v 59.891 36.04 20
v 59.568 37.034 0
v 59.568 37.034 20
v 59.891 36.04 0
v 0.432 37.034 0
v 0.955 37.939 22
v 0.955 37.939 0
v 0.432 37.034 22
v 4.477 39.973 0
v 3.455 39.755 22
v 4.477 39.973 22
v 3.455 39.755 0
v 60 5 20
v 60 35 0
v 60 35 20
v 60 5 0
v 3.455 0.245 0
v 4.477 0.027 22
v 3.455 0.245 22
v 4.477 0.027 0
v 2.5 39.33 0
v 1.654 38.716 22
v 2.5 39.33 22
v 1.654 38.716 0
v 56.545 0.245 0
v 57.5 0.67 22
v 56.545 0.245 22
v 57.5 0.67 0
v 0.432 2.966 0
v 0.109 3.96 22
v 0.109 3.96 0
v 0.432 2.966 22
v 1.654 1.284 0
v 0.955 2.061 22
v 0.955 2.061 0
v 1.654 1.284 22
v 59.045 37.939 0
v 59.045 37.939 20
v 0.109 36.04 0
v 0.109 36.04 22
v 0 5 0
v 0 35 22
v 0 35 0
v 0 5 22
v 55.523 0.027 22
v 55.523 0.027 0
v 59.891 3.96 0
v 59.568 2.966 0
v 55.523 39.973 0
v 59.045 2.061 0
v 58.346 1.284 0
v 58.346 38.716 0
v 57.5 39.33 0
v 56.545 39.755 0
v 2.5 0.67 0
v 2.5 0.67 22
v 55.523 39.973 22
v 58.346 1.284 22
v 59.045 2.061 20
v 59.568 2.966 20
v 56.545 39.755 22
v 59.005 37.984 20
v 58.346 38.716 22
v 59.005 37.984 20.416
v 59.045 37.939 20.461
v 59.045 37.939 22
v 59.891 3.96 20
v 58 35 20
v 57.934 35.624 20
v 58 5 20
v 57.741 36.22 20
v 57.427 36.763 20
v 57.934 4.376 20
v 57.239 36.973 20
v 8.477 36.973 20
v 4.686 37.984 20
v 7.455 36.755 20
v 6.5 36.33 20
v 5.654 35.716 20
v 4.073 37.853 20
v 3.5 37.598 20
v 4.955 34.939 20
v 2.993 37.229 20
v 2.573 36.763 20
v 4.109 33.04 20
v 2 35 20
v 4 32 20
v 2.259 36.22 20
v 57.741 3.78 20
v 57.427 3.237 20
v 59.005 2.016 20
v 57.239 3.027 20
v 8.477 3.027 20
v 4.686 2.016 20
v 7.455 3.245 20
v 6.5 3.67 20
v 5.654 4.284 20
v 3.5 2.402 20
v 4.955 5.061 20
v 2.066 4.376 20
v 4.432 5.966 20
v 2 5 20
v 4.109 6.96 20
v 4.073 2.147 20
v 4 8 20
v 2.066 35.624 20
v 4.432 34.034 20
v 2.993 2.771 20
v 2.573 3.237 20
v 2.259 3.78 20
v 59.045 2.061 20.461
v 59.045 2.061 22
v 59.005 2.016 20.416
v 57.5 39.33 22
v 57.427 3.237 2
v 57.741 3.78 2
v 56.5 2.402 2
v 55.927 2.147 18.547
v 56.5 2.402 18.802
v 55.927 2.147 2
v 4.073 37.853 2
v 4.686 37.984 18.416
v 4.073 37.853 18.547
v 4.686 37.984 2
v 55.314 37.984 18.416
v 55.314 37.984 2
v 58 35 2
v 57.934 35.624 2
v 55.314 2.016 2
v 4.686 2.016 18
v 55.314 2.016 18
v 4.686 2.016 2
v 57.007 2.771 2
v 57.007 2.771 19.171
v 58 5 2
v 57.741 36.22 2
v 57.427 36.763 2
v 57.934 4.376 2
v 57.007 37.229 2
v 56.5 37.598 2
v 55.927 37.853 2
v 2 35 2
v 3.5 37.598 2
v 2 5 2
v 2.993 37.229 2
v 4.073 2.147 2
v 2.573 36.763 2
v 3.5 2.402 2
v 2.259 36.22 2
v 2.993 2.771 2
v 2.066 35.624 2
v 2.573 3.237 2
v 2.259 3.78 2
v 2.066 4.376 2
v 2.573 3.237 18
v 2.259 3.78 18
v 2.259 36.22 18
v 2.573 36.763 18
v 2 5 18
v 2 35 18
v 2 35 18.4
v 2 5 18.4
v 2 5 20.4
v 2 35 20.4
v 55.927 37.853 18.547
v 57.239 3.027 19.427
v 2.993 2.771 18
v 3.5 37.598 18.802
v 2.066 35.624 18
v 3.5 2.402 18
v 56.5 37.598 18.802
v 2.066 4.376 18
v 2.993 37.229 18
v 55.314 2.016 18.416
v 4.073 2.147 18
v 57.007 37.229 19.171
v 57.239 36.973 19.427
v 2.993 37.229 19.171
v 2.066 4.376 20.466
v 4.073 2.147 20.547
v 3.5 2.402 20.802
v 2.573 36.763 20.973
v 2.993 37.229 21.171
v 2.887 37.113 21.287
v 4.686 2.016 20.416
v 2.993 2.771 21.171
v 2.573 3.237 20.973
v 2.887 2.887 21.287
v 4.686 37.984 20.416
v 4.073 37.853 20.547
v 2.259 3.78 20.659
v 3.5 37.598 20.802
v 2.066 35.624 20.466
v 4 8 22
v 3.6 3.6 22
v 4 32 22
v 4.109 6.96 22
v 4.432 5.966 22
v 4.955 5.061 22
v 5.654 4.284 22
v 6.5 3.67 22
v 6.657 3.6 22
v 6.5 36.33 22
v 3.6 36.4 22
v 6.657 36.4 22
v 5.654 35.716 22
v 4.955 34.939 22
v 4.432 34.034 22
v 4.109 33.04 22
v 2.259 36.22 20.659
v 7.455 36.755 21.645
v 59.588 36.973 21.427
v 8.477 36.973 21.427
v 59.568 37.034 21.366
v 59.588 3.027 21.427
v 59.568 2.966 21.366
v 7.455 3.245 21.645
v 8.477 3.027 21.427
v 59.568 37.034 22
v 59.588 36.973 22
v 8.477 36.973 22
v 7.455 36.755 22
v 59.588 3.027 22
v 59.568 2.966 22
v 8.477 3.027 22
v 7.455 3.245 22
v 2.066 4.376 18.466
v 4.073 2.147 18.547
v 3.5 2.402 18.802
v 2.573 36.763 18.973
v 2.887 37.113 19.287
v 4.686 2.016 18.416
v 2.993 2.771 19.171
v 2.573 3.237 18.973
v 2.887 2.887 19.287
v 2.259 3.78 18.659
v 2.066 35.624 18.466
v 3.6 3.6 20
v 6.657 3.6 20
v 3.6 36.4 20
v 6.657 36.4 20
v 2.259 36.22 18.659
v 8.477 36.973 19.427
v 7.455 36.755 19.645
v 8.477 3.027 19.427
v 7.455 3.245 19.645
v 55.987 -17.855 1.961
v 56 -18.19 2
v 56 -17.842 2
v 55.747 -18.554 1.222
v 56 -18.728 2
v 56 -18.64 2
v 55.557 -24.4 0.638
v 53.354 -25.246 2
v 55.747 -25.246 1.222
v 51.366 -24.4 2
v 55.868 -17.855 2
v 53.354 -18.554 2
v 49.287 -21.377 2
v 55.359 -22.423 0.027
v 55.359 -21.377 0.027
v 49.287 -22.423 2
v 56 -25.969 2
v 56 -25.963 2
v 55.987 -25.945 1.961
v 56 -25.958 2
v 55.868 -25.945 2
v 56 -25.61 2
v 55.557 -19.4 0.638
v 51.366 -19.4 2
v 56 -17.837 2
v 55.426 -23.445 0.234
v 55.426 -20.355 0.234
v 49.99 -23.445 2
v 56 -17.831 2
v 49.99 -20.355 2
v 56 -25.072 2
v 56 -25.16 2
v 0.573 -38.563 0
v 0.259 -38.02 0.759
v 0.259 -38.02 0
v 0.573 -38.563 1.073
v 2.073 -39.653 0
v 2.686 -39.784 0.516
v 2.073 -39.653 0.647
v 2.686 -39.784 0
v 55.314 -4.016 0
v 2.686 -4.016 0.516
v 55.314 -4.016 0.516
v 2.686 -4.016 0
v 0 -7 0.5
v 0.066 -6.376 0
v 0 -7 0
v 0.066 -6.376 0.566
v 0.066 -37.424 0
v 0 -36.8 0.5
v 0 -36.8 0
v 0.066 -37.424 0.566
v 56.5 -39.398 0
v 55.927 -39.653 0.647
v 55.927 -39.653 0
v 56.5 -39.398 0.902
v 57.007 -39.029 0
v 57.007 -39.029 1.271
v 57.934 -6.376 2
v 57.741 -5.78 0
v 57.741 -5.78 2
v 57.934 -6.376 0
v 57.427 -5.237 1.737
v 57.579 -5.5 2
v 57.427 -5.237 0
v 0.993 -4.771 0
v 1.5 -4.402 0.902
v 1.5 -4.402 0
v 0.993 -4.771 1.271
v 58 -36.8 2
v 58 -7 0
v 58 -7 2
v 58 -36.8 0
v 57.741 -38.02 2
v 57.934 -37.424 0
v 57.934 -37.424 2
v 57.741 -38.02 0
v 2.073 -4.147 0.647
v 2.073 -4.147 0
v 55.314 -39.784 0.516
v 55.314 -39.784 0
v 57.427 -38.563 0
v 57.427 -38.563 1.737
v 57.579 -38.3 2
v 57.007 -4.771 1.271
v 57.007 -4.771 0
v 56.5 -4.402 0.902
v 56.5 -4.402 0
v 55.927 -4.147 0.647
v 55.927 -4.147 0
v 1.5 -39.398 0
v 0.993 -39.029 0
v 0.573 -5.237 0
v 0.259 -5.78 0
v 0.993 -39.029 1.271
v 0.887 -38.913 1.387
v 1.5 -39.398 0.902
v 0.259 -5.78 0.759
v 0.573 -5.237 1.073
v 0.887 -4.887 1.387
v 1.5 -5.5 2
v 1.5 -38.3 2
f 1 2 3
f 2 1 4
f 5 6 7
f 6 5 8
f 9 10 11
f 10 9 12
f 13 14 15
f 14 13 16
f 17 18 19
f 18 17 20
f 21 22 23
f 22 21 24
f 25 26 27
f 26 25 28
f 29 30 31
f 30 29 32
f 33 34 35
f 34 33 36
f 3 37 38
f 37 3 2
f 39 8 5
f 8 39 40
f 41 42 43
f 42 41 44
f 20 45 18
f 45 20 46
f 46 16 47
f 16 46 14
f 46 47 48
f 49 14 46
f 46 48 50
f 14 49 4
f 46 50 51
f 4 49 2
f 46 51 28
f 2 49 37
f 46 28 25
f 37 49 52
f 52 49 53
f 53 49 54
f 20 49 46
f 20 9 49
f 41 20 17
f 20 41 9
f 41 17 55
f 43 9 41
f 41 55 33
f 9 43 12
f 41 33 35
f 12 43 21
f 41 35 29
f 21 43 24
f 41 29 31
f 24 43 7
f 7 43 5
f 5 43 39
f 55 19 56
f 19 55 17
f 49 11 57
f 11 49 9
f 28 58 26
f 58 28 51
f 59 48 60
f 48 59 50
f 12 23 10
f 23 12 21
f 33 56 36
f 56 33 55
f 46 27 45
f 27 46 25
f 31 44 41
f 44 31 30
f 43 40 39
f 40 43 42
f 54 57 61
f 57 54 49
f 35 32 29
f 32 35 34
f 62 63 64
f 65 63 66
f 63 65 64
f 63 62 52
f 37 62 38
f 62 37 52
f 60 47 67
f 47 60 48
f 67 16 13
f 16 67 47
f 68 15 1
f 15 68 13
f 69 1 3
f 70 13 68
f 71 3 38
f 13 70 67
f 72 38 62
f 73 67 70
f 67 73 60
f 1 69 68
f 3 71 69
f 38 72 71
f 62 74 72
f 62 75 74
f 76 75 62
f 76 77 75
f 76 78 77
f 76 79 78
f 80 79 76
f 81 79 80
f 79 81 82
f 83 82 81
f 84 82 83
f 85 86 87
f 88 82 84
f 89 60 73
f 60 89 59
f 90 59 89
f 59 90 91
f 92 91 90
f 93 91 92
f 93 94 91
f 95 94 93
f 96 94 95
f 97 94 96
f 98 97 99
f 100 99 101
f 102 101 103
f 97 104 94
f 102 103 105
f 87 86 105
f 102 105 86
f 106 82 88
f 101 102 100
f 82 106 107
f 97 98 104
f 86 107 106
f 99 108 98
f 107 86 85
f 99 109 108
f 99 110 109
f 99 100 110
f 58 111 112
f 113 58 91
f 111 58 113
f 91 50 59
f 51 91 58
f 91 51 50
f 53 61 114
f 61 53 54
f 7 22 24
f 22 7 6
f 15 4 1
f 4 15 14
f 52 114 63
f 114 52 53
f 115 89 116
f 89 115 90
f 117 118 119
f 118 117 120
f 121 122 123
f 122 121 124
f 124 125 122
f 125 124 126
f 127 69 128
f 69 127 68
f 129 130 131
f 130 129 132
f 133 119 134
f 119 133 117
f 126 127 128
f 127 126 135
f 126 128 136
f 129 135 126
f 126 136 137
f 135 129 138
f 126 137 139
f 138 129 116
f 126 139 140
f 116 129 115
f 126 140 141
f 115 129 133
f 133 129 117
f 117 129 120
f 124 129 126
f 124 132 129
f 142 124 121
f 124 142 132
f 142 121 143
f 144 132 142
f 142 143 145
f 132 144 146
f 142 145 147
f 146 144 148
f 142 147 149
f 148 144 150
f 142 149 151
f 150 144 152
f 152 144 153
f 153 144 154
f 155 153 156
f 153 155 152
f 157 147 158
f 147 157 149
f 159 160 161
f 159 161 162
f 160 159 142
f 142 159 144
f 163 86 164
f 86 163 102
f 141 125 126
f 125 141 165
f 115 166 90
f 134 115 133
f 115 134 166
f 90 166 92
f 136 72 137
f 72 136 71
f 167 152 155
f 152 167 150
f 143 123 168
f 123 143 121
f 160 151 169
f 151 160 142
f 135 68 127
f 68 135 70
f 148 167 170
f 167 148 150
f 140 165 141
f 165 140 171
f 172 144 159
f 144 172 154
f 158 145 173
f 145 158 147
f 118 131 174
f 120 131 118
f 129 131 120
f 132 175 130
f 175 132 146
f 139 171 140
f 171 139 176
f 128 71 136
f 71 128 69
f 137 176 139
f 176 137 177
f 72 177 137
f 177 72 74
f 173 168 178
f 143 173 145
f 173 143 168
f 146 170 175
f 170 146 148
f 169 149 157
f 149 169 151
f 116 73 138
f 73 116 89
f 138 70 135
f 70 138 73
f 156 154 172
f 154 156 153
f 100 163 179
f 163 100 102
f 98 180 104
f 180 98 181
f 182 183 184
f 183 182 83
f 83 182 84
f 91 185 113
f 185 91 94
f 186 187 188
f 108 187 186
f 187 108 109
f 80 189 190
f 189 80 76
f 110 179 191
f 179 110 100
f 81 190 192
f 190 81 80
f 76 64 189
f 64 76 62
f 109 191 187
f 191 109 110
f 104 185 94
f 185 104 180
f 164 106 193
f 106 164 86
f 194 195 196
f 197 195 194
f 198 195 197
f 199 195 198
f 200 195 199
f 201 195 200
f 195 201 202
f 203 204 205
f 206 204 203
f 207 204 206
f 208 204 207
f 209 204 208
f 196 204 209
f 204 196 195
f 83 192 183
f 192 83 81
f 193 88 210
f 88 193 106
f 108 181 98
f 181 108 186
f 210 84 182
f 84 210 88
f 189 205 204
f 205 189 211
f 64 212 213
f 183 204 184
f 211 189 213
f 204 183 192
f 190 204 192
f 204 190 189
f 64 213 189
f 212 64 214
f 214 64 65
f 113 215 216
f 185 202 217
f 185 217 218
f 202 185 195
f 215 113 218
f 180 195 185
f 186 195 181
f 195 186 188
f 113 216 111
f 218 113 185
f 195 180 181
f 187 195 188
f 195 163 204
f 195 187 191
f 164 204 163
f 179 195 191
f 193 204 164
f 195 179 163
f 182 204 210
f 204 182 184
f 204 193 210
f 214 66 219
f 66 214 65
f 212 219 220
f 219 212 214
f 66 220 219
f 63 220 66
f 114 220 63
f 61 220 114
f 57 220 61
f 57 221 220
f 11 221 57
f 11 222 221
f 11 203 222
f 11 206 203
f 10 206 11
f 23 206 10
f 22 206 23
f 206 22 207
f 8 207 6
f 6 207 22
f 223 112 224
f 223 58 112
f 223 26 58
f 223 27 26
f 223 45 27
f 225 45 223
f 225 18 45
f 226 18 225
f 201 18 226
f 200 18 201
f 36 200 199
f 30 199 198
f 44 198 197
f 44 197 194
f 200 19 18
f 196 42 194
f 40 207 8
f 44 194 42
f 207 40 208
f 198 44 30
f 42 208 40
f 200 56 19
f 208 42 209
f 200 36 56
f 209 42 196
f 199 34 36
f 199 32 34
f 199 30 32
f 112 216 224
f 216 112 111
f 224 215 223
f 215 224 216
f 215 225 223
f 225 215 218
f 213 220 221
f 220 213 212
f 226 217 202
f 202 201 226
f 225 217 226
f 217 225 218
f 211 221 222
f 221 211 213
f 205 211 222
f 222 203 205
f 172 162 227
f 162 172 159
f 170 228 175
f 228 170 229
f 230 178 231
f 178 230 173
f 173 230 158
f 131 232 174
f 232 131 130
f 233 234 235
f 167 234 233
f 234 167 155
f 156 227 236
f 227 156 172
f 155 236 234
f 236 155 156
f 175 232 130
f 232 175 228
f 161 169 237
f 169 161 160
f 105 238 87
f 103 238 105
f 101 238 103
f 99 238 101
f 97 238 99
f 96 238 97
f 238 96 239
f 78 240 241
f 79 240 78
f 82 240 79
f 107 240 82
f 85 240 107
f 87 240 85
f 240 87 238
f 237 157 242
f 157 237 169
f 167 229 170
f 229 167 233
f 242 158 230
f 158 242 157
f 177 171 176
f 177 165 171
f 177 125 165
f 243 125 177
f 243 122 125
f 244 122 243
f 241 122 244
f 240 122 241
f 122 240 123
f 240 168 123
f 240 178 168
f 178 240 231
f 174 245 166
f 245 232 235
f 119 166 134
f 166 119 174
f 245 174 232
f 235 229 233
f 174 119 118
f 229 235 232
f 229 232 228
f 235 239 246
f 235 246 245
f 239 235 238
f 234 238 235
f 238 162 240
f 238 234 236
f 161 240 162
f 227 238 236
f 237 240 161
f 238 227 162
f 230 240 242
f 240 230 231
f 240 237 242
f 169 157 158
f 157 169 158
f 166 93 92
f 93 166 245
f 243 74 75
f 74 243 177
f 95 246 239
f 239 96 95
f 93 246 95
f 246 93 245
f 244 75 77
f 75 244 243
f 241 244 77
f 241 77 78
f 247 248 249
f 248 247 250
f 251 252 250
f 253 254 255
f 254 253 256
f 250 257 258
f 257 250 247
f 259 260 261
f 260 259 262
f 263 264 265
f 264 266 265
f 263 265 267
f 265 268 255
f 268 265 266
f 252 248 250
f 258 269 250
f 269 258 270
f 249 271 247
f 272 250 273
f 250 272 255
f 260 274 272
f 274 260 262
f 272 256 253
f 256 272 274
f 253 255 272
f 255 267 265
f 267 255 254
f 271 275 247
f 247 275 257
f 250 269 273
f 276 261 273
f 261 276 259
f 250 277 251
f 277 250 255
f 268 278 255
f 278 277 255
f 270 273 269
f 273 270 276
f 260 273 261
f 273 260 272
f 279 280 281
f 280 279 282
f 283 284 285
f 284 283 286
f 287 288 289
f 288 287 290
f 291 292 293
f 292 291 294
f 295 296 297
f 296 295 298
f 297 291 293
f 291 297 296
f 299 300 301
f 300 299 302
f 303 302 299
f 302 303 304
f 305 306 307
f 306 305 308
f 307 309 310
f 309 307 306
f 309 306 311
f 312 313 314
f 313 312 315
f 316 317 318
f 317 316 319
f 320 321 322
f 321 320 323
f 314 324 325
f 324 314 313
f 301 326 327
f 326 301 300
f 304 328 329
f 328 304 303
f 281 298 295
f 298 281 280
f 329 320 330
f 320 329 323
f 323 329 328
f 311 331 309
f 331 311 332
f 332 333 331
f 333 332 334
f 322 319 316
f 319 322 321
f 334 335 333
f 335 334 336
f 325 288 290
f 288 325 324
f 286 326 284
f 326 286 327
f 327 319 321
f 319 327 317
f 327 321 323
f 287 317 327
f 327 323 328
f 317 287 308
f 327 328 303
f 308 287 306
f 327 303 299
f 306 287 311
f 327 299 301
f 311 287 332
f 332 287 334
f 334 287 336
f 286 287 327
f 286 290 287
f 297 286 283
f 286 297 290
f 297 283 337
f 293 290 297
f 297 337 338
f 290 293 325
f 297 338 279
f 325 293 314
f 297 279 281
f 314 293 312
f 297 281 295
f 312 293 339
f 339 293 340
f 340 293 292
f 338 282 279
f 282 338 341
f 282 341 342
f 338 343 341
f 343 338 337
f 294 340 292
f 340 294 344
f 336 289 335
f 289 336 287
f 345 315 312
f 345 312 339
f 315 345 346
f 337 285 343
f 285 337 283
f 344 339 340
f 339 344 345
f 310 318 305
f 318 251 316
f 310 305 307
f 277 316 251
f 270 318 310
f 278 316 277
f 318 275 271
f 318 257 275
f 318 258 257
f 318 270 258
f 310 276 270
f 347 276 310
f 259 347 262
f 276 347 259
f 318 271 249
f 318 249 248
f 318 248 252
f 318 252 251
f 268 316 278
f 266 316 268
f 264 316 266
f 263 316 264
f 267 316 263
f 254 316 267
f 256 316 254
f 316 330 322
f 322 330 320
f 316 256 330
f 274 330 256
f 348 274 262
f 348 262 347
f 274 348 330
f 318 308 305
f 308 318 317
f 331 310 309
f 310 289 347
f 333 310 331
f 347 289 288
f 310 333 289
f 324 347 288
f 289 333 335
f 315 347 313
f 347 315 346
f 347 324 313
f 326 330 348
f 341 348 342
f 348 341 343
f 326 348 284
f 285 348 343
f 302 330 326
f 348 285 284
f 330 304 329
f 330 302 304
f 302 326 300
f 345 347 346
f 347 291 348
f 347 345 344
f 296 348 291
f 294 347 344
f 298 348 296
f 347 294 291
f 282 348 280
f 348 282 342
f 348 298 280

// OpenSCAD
itemsShown="both"; // [both,box,lid]
boxLength=60;
boxWidth=40;
boxHeight=22;
cornerRadius=5;
wallThickness=2;
bottomThickness=2;
lidThickness=2;
lidClearance=0.2;
lidEdgeThickness=0.5;
// Notch in the lid
withNotch=true;//true;//[true:false]

/* [Global] */
if (itemsShown=="box") showBox();
if (itemsShown=="lid") showLid();
if (itemsShown=="both"){showBox();showLid();}

module showLid(){
	translate ([0, -2*wallThickness, 0]) 
	roundBoxLid(l=boxLength-wallThickness,
				w=boxWidth-2*wallThickness-lidClearance,
				h=lidThickness,
				et=lidEdgeThickness,
				r=cornerRadius-wallThickness,
				notch=withNotch);
}

module showBox(){
	round_box(l=boxLength,
			  w=boxWidth,
			  h=boxHeight,
			  bt=bottomThickness,
			  wt=wallThickness,
			  lt=lidThickness,
			  r=cornerRadius);
}

module round_box(l=40,w=30,h=30,bt=2,wt=2,lt=2,r=5){
	difference() { 
		round_cube(l=l,w=w,h=h-lt,r=r);
		translate ([wt, wt, bt]) 
		round_cube(l=l-wt*2,w=w-wt*2,h=h,r=r-wt);
	}
	//use two box rims. one to make a slope to support the lid
	roundBoxRim();
	translate ([0, 0, -wt]) roundBoxRim();
}

module roundBoxRim(l=boxLength,
				   w=boxWidth,
				   h=boxHeight,
				   et=lidEdgeThickness,
				   r=cornerRadius,
				   wt=wallThickness,
				   lt=lidThickness){
	difference() { 
		translate ([0, 0, h-lt]) 
		round_cube(l=l,w=w,h=lt,r=r);
		translate ([wt+lt,wt+lt-et*2,h-lt-0.1]) 
		round_cube(l=l*2,w=w-2*(wt+lt)+4*et,h=lt+0.2,r=r-wt+lt);

		//subtract out a lid to make the ledge
		translate ([wt, w-wt, h-lt-0.1])
		roundBoxLid(l=l*2,w=w-2*wt,h=lt+0.1,wt=wt,t=lt,et=0.5,r=r-wt,notch=false);
	}
}

module roundBoxLid(l=40,w=30,h=3,wt=2,t=2,et=0.5,r=5,notch=true){
	translate ([l, 0, 0]) 
	rotate (a = [0, 0, 180]) 
	difference(){
		round_cube(l=l,w=w,h=h,r=r);

		translate ([-1, 0, et]) rotate (a = [45, 0, 0])  cube (size = [l+2, h*2, h*2]); 
		translate ([-1, w, et]) rotate (a = [45, 0, 0])  cube (size = [l+2, h*2, h*2]); 
		translate ([l, -1, et]) rotate (a = [45, 0, 90]) cube (size = [w+2, h*2, h*2]); 
		if (notch==true){
			translate([2,w/2,h+0.001]) thumbNotch(10/2,72,t);
		}
	}
}

module thumbNotch(
	thumbR=12/2,
	angle=72,
	notchHeight=2){

	size=10*thumbR;

	rotate([0,0,90])
	difference(){
		translate([0,
					(thumbR*sin(angle)-notchHeight)/tan(angle),
					 thumbR*sin(angle)-notchHeight])
		rotate([angle,0,0])
		cylinder(r=thumbR,h=size,$fn=30);

		translate([-size,-size,0])
		cube(size*2);
	}
}

module round_cube(l=40,w=30,h=20,r=5,$fn=30){
	hull(){ 
		translate ([r, r, 0]) cylinder (h = h, r=r);
		translate ([r, w-r, 0]) cylinder (h = h, r=r);
		translate ([l-r,w-r, 0]) cylinder (h = h, r=r);
		translate ([l-r, r, 0]) cylinder (h = h, r=r);
	}
}
